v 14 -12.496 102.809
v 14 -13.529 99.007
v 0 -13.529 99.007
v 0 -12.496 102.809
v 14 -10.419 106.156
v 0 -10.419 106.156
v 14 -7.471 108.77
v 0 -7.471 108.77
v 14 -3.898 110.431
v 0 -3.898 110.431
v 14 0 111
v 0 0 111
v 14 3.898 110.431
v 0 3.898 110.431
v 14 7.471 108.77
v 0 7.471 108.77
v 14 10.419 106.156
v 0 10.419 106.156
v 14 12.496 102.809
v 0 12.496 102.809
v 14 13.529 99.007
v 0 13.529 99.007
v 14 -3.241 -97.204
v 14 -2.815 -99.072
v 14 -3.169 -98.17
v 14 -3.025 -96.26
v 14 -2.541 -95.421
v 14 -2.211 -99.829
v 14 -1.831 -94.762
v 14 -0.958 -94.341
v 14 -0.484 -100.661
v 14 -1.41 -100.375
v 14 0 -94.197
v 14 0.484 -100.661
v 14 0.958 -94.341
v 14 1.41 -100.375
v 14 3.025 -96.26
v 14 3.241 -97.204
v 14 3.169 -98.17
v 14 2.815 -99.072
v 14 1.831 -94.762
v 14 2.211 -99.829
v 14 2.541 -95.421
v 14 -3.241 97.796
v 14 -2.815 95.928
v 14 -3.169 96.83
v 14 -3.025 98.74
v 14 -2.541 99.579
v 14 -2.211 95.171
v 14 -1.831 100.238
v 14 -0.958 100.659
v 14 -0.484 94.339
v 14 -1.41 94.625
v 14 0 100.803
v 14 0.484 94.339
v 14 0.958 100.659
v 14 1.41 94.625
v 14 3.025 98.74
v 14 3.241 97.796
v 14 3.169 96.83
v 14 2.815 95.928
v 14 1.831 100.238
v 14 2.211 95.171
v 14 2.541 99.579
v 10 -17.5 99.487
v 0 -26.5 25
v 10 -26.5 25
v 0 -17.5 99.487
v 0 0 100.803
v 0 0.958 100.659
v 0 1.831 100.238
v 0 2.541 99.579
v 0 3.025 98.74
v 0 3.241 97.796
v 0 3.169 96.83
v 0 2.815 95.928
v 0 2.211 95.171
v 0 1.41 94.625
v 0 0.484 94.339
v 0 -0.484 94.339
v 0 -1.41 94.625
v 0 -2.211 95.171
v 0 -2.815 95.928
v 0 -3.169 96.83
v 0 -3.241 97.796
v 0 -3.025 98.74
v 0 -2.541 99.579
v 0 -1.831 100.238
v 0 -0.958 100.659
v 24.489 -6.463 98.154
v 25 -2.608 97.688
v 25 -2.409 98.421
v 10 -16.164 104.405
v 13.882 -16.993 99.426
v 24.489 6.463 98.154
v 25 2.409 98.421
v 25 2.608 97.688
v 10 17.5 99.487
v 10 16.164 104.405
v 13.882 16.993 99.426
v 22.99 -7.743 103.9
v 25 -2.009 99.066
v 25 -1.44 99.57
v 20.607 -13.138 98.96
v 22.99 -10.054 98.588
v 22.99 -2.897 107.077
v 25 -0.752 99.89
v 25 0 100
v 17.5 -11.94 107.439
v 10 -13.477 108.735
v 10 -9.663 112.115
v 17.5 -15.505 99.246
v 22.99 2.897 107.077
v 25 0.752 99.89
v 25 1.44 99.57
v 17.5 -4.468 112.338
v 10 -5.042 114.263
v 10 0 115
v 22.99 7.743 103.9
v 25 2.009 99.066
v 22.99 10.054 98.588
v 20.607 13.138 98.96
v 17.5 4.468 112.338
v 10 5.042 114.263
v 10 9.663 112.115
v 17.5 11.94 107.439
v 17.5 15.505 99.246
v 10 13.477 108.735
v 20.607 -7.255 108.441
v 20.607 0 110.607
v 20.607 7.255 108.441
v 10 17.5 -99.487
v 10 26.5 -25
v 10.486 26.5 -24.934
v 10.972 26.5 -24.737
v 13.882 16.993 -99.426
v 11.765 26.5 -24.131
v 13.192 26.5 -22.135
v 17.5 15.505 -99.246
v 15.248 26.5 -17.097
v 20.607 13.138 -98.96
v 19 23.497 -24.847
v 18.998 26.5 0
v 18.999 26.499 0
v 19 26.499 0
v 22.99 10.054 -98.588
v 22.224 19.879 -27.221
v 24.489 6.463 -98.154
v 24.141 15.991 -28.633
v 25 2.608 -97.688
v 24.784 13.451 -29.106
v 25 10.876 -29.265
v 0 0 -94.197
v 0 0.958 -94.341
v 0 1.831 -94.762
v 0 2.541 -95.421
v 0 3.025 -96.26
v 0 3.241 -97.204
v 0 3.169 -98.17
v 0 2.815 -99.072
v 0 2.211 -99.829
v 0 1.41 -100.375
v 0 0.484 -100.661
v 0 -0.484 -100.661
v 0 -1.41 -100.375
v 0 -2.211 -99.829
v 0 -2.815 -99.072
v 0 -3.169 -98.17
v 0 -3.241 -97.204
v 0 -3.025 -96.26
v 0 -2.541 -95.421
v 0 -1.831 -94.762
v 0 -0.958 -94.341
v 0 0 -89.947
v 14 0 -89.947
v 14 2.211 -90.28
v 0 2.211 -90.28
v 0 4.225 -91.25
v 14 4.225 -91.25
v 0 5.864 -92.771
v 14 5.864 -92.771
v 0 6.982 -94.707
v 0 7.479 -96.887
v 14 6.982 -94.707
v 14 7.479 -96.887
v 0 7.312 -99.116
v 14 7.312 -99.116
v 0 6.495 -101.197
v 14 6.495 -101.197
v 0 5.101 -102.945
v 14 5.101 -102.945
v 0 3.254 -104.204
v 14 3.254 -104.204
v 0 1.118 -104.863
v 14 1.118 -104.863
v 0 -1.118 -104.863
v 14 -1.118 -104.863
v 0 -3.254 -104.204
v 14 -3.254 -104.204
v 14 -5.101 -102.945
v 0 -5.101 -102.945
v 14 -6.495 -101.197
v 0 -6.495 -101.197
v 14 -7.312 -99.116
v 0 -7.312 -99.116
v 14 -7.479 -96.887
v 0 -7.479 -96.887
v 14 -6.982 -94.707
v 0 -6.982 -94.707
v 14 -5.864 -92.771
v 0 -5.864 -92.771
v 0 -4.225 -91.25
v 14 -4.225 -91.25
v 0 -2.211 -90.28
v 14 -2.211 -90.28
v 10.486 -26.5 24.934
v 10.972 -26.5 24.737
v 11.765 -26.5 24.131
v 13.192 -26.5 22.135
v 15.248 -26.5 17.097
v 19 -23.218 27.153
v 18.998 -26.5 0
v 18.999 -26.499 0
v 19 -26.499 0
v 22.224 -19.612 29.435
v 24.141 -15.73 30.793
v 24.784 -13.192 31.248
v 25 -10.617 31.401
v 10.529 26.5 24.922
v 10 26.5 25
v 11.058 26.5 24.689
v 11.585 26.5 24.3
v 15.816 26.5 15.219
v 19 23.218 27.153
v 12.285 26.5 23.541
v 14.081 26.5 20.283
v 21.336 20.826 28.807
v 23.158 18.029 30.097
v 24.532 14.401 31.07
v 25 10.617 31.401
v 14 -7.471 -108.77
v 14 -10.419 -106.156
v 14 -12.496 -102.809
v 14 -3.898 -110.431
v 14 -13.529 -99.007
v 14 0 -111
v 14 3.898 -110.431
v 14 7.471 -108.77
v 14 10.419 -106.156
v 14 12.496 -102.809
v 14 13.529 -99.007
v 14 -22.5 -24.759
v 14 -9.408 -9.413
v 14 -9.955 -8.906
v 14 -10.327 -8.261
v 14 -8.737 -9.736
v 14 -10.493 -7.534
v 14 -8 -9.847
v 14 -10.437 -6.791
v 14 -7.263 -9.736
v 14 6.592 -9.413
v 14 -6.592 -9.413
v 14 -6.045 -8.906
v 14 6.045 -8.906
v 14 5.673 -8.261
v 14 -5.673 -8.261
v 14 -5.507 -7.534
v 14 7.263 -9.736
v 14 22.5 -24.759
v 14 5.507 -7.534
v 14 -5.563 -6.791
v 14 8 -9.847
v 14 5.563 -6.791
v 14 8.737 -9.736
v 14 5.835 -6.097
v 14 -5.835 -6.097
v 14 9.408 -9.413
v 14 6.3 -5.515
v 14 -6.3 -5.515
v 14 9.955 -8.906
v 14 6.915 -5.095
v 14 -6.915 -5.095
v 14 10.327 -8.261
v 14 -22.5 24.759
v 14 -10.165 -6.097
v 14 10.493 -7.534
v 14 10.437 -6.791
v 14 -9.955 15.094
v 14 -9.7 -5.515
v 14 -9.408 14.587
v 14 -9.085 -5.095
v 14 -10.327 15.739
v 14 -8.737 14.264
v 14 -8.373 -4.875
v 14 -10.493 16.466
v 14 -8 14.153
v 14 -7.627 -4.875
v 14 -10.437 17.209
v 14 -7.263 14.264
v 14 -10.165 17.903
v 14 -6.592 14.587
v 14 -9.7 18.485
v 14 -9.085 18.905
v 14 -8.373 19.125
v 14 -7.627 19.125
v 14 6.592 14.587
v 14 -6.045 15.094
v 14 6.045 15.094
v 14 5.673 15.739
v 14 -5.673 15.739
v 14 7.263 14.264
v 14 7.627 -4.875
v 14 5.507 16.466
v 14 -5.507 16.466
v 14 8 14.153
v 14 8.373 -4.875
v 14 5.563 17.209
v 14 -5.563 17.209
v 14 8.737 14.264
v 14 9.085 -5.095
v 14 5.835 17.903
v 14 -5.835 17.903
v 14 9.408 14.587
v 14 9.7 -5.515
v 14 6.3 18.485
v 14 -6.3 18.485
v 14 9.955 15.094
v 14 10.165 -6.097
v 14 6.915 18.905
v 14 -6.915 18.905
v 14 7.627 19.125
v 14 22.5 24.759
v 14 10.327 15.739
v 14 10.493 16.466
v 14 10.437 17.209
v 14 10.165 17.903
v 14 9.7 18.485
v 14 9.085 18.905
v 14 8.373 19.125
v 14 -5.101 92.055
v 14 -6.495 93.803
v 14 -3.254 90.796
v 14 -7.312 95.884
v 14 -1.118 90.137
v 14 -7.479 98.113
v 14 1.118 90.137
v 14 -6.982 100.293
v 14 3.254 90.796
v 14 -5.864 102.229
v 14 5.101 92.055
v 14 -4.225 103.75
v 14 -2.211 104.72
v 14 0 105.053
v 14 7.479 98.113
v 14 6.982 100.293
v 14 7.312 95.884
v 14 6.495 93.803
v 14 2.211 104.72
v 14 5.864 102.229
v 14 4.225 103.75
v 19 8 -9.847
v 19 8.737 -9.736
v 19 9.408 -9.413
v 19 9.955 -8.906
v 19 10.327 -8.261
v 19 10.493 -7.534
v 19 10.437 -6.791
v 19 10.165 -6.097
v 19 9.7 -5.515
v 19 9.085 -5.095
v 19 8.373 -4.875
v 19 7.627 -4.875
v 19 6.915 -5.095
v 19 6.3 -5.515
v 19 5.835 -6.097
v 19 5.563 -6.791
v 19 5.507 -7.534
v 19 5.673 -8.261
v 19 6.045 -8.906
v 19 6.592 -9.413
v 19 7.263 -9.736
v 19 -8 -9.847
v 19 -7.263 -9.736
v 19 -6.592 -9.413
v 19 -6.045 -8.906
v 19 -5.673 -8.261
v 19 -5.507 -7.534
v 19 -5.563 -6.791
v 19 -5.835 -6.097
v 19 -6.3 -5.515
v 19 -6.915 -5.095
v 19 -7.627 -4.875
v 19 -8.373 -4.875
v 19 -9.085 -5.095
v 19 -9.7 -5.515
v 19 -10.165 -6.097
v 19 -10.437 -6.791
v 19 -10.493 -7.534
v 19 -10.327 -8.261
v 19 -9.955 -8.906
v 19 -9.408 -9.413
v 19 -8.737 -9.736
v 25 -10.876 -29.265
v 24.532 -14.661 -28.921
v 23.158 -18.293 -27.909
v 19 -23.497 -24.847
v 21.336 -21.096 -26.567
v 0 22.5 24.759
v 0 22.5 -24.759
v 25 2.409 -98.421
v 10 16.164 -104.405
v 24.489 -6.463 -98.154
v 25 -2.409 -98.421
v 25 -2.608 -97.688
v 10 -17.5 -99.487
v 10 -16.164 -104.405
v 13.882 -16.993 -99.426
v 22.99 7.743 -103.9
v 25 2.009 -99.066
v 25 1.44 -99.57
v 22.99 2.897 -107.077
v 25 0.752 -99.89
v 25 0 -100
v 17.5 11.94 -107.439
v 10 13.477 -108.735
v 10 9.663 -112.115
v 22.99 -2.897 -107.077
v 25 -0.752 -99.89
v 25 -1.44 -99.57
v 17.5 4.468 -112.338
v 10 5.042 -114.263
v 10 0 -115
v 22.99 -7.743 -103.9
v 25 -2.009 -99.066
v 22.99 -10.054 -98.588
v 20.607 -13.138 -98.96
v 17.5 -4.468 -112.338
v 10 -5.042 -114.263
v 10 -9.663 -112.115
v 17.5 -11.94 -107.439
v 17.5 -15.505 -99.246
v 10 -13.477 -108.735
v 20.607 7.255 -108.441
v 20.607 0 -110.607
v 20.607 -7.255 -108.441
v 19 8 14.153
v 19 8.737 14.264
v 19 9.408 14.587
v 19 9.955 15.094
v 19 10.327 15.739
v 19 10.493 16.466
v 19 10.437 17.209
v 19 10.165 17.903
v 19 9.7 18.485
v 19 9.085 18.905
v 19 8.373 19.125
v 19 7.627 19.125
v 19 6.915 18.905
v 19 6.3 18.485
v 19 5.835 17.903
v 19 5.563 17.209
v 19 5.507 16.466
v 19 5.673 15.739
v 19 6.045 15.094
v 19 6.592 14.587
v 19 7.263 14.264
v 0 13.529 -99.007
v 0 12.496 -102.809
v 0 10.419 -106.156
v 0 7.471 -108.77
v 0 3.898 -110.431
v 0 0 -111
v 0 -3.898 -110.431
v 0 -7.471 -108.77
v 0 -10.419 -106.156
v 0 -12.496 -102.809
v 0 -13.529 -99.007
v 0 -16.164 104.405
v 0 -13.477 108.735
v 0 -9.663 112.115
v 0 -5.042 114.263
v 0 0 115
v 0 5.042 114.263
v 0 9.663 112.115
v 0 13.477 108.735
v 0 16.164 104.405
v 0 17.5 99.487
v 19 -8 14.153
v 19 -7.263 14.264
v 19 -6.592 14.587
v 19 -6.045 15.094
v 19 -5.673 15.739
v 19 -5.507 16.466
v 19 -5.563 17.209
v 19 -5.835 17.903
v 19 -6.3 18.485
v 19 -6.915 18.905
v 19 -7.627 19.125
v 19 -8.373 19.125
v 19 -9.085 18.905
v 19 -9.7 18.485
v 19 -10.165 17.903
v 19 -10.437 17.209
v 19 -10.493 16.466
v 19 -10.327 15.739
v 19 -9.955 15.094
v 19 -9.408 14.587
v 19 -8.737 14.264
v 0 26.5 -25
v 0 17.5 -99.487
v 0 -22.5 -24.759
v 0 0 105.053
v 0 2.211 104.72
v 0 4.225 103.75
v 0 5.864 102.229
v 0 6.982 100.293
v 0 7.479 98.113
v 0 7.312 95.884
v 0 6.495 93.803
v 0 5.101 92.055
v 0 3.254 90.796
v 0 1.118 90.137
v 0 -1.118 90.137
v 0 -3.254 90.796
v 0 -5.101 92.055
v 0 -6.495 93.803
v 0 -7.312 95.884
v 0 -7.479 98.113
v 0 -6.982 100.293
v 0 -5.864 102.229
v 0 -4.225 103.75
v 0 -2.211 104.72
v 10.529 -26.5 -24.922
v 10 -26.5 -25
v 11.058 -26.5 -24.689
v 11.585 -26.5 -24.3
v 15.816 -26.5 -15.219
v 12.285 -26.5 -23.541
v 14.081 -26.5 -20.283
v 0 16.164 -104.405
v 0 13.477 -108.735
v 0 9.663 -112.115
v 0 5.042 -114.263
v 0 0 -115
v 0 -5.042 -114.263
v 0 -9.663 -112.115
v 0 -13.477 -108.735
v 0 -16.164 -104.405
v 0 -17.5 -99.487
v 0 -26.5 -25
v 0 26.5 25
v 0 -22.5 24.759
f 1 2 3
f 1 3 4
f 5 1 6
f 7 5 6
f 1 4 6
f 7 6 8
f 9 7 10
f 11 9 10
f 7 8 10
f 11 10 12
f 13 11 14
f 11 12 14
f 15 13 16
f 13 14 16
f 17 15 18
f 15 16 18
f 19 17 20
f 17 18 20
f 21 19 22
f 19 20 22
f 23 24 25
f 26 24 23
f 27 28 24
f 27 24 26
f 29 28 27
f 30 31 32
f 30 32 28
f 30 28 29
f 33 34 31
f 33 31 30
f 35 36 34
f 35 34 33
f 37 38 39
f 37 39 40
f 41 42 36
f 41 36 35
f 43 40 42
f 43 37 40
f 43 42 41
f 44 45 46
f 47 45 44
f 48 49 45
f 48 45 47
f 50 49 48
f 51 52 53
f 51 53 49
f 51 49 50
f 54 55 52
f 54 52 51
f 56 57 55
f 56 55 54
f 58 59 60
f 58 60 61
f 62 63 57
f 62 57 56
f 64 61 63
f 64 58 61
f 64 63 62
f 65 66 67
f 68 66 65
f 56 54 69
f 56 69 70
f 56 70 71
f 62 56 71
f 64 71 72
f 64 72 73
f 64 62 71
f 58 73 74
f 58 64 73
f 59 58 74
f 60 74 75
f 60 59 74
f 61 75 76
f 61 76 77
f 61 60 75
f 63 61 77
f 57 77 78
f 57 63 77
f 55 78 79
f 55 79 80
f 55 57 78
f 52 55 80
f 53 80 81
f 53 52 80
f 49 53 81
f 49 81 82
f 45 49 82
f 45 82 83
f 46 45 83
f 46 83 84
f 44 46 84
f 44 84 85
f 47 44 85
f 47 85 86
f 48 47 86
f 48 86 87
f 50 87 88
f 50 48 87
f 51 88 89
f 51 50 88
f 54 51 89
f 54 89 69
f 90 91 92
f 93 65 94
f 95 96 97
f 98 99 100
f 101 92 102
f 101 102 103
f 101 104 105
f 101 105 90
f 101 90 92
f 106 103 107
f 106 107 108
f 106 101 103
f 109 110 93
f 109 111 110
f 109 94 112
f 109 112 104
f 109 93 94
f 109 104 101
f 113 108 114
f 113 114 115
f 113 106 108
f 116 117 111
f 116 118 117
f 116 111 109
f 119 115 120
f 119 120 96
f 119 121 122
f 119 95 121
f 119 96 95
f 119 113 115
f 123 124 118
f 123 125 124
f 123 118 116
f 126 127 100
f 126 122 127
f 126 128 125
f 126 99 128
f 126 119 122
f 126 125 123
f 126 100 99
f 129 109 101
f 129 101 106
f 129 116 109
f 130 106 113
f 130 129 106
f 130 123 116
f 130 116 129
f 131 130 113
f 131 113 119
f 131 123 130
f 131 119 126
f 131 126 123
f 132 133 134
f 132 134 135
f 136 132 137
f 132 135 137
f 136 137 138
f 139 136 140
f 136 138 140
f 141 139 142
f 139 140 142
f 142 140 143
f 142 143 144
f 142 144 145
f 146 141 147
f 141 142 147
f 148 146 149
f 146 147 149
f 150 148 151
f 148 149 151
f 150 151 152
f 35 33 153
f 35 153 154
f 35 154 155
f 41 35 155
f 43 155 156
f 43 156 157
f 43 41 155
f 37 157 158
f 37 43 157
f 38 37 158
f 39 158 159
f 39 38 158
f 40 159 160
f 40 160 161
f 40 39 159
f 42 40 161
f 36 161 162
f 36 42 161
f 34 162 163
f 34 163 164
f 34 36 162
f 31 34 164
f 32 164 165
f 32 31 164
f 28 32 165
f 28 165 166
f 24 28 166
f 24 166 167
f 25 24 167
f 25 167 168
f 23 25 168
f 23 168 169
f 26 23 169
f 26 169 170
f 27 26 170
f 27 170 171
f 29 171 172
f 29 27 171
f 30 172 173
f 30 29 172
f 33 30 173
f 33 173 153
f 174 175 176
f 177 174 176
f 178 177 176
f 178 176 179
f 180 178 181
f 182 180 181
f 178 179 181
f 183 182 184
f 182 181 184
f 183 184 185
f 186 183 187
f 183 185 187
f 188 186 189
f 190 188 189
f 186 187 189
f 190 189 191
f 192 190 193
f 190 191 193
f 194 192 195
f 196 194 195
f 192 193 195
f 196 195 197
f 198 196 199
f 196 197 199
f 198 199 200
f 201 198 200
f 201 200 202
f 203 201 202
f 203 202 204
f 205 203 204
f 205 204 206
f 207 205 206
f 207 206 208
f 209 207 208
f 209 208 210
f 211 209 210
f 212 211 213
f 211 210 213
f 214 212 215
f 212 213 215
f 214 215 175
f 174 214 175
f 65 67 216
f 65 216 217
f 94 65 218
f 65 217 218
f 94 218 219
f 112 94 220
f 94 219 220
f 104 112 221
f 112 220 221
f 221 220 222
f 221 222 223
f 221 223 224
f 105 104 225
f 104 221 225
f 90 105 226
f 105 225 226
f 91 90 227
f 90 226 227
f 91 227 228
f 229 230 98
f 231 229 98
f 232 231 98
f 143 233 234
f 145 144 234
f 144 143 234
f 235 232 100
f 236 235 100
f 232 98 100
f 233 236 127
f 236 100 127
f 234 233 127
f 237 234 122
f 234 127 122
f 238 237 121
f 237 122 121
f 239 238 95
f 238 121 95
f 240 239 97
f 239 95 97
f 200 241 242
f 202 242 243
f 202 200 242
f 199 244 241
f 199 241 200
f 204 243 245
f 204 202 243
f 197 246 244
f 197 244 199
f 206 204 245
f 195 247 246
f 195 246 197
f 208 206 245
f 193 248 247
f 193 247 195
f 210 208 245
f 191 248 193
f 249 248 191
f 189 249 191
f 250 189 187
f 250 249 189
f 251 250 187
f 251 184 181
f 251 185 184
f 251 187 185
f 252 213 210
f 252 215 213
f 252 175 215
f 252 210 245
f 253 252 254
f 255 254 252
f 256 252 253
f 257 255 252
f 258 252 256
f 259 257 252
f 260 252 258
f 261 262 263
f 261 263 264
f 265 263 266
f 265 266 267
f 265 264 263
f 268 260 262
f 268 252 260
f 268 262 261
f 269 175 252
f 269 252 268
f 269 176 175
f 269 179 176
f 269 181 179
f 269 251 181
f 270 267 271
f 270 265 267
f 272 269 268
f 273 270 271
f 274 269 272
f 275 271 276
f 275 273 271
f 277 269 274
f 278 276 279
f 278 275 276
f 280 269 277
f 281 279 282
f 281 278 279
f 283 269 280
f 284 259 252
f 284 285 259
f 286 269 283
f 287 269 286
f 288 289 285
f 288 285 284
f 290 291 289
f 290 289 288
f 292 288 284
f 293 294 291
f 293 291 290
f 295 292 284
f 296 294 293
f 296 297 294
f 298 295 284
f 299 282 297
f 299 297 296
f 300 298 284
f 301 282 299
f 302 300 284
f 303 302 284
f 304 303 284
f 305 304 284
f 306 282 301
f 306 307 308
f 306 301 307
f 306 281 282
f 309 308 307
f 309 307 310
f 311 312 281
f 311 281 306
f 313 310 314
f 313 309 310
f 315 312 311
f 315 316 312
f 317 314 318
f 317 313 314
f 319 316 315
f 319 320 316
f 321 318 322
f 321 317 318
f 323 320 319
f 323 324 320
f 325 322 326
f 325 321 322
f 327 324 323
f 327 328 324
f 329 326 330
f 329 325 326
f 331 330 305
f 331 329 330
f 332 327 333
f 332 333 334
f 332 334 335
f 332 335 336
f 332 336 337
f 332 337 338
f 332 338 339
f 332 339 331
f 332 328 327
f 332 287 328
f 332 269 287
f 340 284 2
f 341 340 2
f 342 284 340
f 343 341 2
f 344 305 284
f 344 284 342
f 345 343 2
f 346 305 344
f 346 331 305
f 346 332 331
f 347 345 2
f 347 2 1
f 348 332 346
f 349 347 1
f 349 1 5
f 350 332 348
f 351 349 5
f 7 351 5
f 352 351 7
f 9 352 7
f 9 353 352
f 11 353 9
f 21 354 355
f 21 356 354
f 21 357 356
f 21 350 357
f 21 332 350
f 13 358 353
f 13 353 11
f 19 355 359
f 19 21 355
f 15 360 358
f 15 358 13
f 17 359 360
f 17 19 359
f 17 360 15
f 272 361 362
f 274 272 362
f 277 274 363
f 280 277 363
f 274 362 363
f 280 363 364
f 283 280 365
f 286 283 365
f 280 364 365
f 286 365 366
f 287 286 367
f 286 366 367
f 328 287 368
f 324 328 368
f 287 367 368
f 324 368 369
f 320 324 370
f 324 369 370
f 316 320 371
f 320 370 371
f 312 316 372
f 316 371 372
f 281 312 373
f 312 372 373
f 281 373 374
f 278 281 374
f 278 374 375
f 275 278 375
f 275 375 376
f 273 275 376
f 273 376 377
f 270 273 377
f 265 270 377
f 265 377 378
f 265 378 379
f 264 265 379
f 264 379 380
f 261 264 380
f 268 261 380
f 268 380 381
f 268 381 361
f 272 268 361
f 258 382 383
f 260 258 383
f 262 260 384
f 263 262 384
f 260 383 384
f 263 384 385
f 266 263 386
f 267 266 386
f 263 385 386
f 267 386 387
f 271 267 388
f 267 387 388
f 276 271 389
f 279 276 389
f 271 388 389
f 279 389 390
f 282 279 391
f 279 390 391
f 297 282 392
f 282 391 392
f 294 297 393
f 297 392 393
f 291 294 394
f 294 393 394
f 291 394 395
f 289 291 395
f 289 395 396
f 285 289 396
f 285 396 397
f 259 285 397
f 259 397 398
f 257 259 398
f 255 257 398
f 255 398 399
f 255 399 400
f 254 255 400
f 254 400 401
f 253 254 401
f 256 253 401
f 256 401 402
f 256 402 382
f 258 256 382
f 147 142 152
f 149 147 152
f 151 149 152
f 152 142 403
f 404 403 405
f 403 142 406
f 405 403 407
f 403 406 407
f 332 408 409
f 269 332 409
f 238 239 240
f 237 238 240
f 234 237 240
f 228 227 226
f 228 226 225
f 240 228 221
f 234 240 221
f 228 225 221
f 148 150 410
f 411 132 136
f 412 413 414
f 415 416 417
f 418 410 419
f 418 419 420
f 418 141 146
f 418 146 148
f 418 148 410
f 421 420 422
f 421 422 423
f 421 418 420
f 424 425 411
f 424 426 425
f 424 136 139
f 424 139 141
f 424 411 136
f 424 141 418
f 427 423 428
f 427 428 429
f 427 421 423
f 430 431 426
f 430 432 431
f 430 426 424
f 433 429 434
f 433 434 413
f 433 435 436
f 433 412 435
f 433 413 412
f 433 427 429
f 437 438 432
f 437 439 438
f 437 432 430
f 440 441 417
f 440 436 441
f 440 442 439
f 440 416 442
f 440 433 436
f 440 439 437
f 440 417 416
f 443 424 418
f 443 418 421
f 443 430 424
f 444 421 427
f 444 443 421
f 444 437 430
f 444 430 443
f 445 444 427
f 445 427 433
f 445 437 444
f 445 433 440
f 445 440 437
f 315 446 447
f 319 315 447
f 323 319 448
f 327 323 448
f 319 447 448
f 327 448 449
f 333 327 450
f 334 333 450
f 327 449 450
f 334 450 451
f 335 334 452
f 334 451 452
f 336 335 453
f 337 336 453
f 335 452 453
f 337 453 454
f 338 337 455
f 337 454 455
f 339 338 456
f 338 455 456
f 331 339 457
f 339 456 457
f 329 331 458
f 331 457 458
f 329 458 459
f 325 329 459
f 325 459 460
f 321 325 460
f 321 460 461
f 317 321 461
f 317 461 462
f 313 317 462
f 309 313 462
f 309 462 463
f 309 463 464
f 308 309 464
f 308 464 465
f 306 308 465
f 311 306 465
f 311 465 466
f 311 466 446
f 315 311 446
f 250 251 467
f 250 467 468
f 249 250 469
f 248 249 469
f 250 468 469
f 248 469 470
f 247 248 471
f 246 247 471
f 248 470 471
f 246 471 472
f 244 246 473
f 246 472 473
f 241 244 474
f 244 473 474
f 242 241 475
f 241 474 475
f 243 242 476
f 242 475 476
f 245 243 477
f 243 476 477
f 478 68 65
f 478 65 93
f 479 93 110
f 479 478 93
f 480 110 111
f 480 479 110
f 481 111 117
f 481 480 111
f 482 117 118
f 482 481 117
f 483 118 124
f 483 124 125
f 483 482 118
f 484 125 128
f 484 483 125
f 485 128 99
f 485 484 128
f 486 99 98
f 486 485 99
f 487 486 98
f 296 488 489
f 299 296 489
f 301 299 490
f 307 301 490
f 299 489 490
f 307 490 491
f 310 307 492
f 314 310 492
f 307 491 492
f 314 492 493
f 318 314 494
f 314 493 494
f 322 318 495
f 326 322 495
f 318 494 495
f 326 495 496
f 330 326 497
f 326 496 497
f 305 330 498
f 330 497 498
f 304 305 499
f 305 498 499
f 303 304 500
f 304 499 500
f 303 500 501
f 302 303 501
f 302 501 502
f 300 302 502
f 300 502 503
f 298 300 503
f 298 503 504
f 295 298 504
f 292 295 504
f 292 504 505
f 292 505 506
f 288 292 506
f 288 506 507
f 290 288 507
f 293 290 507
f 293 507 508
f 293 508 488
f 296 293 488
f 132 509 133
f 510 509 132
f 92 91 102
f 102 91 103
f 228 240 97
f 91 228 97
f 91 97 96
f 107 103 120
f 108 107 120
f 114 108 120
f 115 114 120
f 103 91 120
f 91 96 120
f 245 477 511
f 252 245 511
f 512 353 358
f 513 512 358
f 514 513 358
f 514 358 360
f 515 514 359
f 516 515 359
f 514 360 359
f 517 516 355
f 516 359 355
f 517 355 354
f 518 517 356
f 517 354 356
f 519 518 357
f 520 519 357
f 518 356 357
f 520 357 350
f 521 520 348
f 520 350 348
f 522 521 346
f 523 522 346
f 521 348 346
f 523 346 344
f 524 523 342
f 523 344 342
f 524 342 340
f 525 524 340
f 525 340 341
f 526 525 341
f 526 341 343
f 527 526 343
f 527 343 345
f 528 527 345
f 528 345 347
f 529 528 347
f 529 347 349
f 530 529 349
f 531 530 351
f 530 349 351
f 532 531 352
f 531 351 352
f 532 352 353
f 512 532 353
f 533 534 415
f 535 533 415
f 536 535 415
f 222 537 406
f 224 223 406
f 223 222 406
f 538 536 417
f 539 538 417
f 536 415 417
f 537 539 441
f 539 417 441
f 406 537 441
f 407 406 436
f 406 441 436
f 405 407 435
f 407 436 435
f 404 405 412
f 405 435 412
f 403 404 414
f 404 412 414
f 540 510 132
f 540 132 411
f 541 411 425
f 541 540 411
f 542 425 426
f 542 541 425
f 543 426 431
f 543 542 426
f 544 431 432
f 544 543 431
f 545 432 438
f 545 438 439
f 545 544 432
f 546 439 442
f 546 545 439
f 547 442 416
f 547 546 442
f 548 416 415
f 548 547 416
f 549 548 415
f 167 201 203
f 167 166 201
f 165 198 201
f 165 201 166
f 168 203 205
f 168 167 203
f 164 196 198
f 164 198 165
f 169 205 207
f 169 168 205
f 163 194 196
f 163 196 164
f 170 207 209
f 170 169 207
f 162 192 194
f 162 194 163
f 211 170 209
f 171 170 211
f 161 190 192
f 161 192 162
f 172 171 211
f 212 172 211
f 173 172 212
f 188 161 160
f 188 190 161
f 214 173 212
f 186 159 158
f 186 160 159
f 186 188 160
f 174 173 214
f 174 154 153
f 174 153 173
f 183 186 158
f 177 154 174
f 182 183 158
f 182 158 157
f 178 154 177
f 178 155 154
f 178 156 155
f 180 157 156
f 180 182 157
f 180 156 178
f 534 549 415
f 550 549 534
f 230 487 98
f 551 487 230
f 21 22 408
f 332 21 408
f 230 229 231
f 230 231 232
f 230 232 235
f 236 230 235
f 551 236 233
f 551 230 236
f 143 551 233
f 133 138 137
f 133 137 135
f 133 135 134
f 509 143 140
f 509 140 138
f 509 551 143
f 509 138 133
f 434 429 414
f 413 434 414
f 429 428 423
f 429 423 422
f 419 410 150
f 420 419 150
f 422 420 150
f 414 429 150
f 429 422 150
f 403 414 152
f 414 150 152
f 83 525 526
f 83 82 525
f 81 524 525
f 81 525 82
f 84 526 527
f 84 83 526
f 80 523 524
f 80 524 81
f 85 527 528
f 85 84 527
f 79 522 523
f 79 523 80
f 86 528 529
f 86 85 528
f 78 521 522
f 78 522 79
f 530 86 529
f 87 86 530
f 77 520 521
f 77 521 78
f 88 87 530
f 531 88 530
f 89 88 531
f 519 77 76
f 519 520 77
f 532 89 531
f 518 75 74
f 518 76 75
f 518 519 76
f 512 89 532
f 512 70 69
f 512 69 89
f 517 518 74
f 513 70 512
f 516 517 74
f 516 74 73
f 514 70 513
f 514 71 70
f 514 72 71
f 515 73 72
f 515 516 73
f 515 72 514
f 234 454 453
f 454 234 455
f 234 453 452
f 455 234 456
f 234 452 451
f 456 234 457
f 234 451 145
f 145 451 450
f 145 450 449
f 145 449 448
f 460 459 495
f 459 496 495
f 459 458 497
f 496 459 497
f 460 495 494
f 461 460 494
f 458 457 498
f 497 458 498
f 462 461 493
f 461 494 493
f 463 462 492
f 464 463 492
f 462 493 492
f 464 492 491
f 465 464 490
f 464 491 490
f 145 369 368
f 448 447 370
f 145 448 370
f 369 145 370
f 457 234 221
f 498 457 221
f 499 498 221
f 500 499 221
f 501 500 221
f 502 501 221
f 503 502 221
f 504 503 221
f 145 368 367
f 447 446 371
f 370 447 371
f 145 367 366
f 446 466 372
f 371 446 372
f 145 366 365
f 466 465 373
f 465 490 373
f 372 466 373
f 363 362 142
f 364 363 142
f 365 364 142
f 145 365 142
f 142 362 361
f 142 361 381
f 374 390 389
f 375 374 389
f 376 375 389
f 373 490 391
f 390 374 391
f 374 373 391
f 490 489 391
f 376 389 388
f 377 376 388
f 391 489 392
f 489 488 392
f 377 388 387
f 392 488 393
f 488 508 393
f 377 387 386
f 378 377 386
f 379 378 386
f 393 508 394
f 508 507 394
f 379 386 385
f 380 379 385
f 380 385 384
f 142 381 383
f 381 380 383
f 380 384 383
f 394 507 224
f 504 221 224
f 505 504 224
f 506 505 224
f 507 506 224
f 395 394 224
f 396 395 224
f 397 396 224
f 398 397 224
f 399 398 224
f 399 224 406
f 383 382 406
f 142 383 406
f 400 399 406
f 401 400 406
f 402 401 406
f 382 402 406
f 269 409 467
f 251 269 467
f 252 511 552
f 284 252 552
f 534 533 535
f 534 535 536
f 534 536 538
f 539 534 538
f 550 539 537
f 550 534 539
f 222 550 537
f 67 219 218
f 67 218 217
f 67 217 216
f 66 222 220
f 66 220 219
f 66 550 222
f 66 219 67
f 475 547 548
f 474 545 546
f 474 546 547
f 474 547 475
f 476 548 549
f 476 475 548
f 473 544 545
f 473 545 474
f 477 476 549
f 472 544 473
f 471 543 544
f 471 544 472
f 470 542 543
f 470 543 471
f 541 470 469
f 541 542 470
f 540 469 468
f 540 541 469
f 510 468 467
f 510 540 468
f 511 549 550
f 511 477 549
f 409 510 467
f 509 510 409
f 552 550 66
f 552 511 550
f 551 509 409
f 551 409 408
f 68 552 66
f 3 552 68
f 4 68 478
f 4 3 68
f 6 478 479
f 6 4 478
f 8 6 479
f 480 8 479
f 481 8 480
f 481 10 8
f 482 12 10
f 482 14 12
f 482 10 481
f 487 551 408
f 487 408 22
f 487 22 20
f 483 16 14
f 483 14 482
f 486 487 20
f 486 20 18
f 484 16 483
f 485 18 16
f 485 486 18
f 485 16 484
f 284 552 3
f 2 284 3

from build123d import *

# Parameters (mm, degrees)
EXTRUDE_1_DEPTH          = 25
FILLET_2_R               = 15
CUT_EXTRUDE_2_DEPTH      = 121.632707028
CUT_EXTRUDE_2_DEPTH_BACK = 121.632707028
SKETCH_9_R               = 2.5
CUT_EXTRUDE_3_DEPTH      = 120.533468117
PATTERN_LINEAR_1_COUNT   = 2
PATTERN_LINEAR_1_PITCH   = 24
CUT_EXTRUDE_4_DEPTH      = 14
SKETCH_11_R              = 7.5
SKETCH_11_R_2            = 3.25
EXTRUDE_3_DEPTH          = 14
PATTERN_LINEAR_2_COUNT   = 2
PATTERN_LINEAR_2_PITCH   = 195


with BuildPart() as part:
    # Эскиз4 → Бобышка-Вытянуть1 (new body)
    with BuildSketch(Plane(origin=(0, 0, 0), x_dir=(0, 0, -1), z_dir=(1, 0, 0))):
        with BuildLine():
            Line((-25, 26.5), (25, 26.5))
            Line((25, 26.5), (99.487179761, 17.5))
            ThreePointArc((99.487179761, 17.5), (115, 0), (99.487179761, -17.5))
            Line((99.487179761, -17.5), (25, -26.5))
            Line((25, -26.5), (-25, -26.5))
            Line((-25, -26.5), (-99.487179761, -17.5))
            ThreePointArc((-99.487179761, -17.5), (-115, 0), (-99.487179761, 17.5))
            Line((-99.487179761, 17.5), (-25, 26.5))
        make_face()
    extrude(amount=EXTRUDE_1_DEPTH)

    # Скругление2
    # the kernel refuses this fillet: 15 mm, written as the material it takes off along each edge
    with BuildSketch(Plane(origin=(25, 30.998265024, 12.229230609), x_dir=(-1, 0, 0), z_dir=(0, -0.11995373398361225, -0.9927794829182304)), Plane(origin=(25, 17.5, 99.487179761), x_dir=(-1, 0, 0), z_dir=(0, 0.11995373398361225, -0.9927794829182304)), Plane(origin=(25, -30.998265024, -12.229230609), x_dir=(-1, 0, 0), z_dir=(0, 0.11995373398361238, 0.9927794829182304)), Plane(origin=(25, -17.5, -99.487179761), x_dir=(-1, 0, 0), z_dir=(0, -0.1199537339836124, 0.9927794829182304))) as fillet_2_piece_1:
        with BuildLine():
            CenterArc((FILLET_2_R, -FILLET_2_R), FILLET_2_R, 90, 90)
            Line((0, -FILLET_2_R), (0, 0))
            Line((0, 0), (FILLET_2_R, 0))
        make_face()
    extrude(amount=112.528927413, mode=Mode.SUBTRACT)
    with BuildSketch(Plane(origin=(25, 0, -97.372721938), x_dir=(0, 0.9927794829182303, -0.11995373398361334), z_dir=(0, 0.11995373398361334, 0.9927794829182303))) as fillet_2_piece_2:
        with BuildLine():
            CenterArc((17.627278062 - FILLET_2_R, FILLET_2_R), FILLET_2_R, 270, 90)
            Line((17.627278062 - FILLET_2_R, 0), (17.627278062, 0))
            Line((17.627278062, 0), (17.627278062, FILLET_2_R))
        make_face()
    revolve(axis=Axis((25, 0, -97.372721938), (-1, 0, 0)), revolution_arc=166.221135111, mode=Mode.SUBTRACT)
    with BuildSketch(Plane(origin=(25, 0, 97.372721938), x_dir=(0, -0.9927794829182303, 0.11995373398361334), z_dir=(0, -0.11995373398361334, -0.9927794829182303))) as fillet_2_piece_3:
        with BuildLine():
            CenterArc((17.627278062 - FILLET_2_R, FILLET_2_R), FILLET_2_R, 270, 90)
            Line((17.627278062 - FILLET_2_R, 0), (17.627278062, 0))
            Line((17.627278062, 0), (17.627278062, FILLET_2_R))
        make_face()
    revolve(axis=Axis((25, 0, 97.372721938), (-1, 0, 0)), revolution_arc=166.221135111, mode=Mode.SUBTRACT)

    # Эскиз8 → Вырез-Вытянуть2 (cut, two sides: drawn at the far end of the back side and taken through both)
    with BuildSketch(Plane(origin=(0, 0, 0), x_dir=(1, 0, 0), z_dir=(0, 1, 0)).offset(-CUT_EXTRUDE_2_DEPTH_BACK)):
        Polygon((19, -27.152763866), (19, 24.847236134), (28, 31.474618083), (28, -33.525381917), align=None)
    extrude(amount=CUT_EXTRUDE_2_DEPTH + CUT_EXTRUDE_2_DEPTH_BACK, mode=Mode.SUBTRACT)

    # Эскиз9 → Вырез-Вытянуть3 (cut, through all)
    with BuildSketch(Plane(origin=(19, 0, 0), x_dir=(0, 0, -1), z_dir=(1, 0, 0))):
        with Locations((-16.652763866, 8)):
            Circle(SKETCH_9_R)
        with Locations((-16.652763866, -8)):
            Circle(SKETCH_9_R)
    cut_extrude_3 = extrude(amount=-CUT_EXTRUDE_3_DEPTH, mode=Mode.SUBTRACT)

    # Линейный массив1: Вырез-Вытянуть3 ×2
    with Locations(*[(0, 0, -i * PATTERN_LINEAR_1_PITCH) for i in range(1, PATTERN_LINEAR_1_COUNT)]):
        add(cut_extrude_3, mode=Mode.SUBTRACT)

    # Эскиз10 → Вырез-Вытянуть4 (cut)
    with BuildSketch(Plane.ZY):
        with BuildLine():
            Line((99.007364825, 13.528882068), (24.759223266, 22.5))
            Line((24.759223266, 22.5), (-24.759223266, 22.5))
            Line((-24.759223266, 22.5), (-99.007364825, 13.528882068))
            ThreePointArc((-99.007364825, 13.528882068), (-111, 0), (-99.007364825, -13.528882068))
            Line((-99.007364825, -13.528882068), (-24.759223266, -22.5))
            Line((-24.759223266, -22.5), (24.759223266, -22.5))
            Line((24.759223266, -22.5), (99.007364825, -13.528882068))
            ThreePointArc((99.007364825, -13.528882068), (111, 0), (99.007364825, 13.528882068))
        make_face()
    extrude(amount=-CUT_EXTRUDE_4_DEPTH, mode=Mode.SUBTRACT)

    # Эскиз11 → Бобышка-Вытянуть3 (add)
    with BuildSketch(Plane.ZY.offset(-14)):
        with Locations((97.552941864, 0)):
            Circle(SKETCH_11_R)
        with Locations((97.552941864, 0)):
            Circle(SKETCH_11_R_2, mode=Mode.SUBTRACT)
    extrude_3 = extrude(amount=EXTRUDE_3_DEPTH)

    # Линейный массив2: Бобышка-Вытянуть3 ×2
    with Locations(*[(0, 0, -i * PATTERN_LINEAR_2_PITCH) for i in range(1, PATTERN_LINEAR_2_COUNT)]):
        add(extrude_3)


solid = part.part
